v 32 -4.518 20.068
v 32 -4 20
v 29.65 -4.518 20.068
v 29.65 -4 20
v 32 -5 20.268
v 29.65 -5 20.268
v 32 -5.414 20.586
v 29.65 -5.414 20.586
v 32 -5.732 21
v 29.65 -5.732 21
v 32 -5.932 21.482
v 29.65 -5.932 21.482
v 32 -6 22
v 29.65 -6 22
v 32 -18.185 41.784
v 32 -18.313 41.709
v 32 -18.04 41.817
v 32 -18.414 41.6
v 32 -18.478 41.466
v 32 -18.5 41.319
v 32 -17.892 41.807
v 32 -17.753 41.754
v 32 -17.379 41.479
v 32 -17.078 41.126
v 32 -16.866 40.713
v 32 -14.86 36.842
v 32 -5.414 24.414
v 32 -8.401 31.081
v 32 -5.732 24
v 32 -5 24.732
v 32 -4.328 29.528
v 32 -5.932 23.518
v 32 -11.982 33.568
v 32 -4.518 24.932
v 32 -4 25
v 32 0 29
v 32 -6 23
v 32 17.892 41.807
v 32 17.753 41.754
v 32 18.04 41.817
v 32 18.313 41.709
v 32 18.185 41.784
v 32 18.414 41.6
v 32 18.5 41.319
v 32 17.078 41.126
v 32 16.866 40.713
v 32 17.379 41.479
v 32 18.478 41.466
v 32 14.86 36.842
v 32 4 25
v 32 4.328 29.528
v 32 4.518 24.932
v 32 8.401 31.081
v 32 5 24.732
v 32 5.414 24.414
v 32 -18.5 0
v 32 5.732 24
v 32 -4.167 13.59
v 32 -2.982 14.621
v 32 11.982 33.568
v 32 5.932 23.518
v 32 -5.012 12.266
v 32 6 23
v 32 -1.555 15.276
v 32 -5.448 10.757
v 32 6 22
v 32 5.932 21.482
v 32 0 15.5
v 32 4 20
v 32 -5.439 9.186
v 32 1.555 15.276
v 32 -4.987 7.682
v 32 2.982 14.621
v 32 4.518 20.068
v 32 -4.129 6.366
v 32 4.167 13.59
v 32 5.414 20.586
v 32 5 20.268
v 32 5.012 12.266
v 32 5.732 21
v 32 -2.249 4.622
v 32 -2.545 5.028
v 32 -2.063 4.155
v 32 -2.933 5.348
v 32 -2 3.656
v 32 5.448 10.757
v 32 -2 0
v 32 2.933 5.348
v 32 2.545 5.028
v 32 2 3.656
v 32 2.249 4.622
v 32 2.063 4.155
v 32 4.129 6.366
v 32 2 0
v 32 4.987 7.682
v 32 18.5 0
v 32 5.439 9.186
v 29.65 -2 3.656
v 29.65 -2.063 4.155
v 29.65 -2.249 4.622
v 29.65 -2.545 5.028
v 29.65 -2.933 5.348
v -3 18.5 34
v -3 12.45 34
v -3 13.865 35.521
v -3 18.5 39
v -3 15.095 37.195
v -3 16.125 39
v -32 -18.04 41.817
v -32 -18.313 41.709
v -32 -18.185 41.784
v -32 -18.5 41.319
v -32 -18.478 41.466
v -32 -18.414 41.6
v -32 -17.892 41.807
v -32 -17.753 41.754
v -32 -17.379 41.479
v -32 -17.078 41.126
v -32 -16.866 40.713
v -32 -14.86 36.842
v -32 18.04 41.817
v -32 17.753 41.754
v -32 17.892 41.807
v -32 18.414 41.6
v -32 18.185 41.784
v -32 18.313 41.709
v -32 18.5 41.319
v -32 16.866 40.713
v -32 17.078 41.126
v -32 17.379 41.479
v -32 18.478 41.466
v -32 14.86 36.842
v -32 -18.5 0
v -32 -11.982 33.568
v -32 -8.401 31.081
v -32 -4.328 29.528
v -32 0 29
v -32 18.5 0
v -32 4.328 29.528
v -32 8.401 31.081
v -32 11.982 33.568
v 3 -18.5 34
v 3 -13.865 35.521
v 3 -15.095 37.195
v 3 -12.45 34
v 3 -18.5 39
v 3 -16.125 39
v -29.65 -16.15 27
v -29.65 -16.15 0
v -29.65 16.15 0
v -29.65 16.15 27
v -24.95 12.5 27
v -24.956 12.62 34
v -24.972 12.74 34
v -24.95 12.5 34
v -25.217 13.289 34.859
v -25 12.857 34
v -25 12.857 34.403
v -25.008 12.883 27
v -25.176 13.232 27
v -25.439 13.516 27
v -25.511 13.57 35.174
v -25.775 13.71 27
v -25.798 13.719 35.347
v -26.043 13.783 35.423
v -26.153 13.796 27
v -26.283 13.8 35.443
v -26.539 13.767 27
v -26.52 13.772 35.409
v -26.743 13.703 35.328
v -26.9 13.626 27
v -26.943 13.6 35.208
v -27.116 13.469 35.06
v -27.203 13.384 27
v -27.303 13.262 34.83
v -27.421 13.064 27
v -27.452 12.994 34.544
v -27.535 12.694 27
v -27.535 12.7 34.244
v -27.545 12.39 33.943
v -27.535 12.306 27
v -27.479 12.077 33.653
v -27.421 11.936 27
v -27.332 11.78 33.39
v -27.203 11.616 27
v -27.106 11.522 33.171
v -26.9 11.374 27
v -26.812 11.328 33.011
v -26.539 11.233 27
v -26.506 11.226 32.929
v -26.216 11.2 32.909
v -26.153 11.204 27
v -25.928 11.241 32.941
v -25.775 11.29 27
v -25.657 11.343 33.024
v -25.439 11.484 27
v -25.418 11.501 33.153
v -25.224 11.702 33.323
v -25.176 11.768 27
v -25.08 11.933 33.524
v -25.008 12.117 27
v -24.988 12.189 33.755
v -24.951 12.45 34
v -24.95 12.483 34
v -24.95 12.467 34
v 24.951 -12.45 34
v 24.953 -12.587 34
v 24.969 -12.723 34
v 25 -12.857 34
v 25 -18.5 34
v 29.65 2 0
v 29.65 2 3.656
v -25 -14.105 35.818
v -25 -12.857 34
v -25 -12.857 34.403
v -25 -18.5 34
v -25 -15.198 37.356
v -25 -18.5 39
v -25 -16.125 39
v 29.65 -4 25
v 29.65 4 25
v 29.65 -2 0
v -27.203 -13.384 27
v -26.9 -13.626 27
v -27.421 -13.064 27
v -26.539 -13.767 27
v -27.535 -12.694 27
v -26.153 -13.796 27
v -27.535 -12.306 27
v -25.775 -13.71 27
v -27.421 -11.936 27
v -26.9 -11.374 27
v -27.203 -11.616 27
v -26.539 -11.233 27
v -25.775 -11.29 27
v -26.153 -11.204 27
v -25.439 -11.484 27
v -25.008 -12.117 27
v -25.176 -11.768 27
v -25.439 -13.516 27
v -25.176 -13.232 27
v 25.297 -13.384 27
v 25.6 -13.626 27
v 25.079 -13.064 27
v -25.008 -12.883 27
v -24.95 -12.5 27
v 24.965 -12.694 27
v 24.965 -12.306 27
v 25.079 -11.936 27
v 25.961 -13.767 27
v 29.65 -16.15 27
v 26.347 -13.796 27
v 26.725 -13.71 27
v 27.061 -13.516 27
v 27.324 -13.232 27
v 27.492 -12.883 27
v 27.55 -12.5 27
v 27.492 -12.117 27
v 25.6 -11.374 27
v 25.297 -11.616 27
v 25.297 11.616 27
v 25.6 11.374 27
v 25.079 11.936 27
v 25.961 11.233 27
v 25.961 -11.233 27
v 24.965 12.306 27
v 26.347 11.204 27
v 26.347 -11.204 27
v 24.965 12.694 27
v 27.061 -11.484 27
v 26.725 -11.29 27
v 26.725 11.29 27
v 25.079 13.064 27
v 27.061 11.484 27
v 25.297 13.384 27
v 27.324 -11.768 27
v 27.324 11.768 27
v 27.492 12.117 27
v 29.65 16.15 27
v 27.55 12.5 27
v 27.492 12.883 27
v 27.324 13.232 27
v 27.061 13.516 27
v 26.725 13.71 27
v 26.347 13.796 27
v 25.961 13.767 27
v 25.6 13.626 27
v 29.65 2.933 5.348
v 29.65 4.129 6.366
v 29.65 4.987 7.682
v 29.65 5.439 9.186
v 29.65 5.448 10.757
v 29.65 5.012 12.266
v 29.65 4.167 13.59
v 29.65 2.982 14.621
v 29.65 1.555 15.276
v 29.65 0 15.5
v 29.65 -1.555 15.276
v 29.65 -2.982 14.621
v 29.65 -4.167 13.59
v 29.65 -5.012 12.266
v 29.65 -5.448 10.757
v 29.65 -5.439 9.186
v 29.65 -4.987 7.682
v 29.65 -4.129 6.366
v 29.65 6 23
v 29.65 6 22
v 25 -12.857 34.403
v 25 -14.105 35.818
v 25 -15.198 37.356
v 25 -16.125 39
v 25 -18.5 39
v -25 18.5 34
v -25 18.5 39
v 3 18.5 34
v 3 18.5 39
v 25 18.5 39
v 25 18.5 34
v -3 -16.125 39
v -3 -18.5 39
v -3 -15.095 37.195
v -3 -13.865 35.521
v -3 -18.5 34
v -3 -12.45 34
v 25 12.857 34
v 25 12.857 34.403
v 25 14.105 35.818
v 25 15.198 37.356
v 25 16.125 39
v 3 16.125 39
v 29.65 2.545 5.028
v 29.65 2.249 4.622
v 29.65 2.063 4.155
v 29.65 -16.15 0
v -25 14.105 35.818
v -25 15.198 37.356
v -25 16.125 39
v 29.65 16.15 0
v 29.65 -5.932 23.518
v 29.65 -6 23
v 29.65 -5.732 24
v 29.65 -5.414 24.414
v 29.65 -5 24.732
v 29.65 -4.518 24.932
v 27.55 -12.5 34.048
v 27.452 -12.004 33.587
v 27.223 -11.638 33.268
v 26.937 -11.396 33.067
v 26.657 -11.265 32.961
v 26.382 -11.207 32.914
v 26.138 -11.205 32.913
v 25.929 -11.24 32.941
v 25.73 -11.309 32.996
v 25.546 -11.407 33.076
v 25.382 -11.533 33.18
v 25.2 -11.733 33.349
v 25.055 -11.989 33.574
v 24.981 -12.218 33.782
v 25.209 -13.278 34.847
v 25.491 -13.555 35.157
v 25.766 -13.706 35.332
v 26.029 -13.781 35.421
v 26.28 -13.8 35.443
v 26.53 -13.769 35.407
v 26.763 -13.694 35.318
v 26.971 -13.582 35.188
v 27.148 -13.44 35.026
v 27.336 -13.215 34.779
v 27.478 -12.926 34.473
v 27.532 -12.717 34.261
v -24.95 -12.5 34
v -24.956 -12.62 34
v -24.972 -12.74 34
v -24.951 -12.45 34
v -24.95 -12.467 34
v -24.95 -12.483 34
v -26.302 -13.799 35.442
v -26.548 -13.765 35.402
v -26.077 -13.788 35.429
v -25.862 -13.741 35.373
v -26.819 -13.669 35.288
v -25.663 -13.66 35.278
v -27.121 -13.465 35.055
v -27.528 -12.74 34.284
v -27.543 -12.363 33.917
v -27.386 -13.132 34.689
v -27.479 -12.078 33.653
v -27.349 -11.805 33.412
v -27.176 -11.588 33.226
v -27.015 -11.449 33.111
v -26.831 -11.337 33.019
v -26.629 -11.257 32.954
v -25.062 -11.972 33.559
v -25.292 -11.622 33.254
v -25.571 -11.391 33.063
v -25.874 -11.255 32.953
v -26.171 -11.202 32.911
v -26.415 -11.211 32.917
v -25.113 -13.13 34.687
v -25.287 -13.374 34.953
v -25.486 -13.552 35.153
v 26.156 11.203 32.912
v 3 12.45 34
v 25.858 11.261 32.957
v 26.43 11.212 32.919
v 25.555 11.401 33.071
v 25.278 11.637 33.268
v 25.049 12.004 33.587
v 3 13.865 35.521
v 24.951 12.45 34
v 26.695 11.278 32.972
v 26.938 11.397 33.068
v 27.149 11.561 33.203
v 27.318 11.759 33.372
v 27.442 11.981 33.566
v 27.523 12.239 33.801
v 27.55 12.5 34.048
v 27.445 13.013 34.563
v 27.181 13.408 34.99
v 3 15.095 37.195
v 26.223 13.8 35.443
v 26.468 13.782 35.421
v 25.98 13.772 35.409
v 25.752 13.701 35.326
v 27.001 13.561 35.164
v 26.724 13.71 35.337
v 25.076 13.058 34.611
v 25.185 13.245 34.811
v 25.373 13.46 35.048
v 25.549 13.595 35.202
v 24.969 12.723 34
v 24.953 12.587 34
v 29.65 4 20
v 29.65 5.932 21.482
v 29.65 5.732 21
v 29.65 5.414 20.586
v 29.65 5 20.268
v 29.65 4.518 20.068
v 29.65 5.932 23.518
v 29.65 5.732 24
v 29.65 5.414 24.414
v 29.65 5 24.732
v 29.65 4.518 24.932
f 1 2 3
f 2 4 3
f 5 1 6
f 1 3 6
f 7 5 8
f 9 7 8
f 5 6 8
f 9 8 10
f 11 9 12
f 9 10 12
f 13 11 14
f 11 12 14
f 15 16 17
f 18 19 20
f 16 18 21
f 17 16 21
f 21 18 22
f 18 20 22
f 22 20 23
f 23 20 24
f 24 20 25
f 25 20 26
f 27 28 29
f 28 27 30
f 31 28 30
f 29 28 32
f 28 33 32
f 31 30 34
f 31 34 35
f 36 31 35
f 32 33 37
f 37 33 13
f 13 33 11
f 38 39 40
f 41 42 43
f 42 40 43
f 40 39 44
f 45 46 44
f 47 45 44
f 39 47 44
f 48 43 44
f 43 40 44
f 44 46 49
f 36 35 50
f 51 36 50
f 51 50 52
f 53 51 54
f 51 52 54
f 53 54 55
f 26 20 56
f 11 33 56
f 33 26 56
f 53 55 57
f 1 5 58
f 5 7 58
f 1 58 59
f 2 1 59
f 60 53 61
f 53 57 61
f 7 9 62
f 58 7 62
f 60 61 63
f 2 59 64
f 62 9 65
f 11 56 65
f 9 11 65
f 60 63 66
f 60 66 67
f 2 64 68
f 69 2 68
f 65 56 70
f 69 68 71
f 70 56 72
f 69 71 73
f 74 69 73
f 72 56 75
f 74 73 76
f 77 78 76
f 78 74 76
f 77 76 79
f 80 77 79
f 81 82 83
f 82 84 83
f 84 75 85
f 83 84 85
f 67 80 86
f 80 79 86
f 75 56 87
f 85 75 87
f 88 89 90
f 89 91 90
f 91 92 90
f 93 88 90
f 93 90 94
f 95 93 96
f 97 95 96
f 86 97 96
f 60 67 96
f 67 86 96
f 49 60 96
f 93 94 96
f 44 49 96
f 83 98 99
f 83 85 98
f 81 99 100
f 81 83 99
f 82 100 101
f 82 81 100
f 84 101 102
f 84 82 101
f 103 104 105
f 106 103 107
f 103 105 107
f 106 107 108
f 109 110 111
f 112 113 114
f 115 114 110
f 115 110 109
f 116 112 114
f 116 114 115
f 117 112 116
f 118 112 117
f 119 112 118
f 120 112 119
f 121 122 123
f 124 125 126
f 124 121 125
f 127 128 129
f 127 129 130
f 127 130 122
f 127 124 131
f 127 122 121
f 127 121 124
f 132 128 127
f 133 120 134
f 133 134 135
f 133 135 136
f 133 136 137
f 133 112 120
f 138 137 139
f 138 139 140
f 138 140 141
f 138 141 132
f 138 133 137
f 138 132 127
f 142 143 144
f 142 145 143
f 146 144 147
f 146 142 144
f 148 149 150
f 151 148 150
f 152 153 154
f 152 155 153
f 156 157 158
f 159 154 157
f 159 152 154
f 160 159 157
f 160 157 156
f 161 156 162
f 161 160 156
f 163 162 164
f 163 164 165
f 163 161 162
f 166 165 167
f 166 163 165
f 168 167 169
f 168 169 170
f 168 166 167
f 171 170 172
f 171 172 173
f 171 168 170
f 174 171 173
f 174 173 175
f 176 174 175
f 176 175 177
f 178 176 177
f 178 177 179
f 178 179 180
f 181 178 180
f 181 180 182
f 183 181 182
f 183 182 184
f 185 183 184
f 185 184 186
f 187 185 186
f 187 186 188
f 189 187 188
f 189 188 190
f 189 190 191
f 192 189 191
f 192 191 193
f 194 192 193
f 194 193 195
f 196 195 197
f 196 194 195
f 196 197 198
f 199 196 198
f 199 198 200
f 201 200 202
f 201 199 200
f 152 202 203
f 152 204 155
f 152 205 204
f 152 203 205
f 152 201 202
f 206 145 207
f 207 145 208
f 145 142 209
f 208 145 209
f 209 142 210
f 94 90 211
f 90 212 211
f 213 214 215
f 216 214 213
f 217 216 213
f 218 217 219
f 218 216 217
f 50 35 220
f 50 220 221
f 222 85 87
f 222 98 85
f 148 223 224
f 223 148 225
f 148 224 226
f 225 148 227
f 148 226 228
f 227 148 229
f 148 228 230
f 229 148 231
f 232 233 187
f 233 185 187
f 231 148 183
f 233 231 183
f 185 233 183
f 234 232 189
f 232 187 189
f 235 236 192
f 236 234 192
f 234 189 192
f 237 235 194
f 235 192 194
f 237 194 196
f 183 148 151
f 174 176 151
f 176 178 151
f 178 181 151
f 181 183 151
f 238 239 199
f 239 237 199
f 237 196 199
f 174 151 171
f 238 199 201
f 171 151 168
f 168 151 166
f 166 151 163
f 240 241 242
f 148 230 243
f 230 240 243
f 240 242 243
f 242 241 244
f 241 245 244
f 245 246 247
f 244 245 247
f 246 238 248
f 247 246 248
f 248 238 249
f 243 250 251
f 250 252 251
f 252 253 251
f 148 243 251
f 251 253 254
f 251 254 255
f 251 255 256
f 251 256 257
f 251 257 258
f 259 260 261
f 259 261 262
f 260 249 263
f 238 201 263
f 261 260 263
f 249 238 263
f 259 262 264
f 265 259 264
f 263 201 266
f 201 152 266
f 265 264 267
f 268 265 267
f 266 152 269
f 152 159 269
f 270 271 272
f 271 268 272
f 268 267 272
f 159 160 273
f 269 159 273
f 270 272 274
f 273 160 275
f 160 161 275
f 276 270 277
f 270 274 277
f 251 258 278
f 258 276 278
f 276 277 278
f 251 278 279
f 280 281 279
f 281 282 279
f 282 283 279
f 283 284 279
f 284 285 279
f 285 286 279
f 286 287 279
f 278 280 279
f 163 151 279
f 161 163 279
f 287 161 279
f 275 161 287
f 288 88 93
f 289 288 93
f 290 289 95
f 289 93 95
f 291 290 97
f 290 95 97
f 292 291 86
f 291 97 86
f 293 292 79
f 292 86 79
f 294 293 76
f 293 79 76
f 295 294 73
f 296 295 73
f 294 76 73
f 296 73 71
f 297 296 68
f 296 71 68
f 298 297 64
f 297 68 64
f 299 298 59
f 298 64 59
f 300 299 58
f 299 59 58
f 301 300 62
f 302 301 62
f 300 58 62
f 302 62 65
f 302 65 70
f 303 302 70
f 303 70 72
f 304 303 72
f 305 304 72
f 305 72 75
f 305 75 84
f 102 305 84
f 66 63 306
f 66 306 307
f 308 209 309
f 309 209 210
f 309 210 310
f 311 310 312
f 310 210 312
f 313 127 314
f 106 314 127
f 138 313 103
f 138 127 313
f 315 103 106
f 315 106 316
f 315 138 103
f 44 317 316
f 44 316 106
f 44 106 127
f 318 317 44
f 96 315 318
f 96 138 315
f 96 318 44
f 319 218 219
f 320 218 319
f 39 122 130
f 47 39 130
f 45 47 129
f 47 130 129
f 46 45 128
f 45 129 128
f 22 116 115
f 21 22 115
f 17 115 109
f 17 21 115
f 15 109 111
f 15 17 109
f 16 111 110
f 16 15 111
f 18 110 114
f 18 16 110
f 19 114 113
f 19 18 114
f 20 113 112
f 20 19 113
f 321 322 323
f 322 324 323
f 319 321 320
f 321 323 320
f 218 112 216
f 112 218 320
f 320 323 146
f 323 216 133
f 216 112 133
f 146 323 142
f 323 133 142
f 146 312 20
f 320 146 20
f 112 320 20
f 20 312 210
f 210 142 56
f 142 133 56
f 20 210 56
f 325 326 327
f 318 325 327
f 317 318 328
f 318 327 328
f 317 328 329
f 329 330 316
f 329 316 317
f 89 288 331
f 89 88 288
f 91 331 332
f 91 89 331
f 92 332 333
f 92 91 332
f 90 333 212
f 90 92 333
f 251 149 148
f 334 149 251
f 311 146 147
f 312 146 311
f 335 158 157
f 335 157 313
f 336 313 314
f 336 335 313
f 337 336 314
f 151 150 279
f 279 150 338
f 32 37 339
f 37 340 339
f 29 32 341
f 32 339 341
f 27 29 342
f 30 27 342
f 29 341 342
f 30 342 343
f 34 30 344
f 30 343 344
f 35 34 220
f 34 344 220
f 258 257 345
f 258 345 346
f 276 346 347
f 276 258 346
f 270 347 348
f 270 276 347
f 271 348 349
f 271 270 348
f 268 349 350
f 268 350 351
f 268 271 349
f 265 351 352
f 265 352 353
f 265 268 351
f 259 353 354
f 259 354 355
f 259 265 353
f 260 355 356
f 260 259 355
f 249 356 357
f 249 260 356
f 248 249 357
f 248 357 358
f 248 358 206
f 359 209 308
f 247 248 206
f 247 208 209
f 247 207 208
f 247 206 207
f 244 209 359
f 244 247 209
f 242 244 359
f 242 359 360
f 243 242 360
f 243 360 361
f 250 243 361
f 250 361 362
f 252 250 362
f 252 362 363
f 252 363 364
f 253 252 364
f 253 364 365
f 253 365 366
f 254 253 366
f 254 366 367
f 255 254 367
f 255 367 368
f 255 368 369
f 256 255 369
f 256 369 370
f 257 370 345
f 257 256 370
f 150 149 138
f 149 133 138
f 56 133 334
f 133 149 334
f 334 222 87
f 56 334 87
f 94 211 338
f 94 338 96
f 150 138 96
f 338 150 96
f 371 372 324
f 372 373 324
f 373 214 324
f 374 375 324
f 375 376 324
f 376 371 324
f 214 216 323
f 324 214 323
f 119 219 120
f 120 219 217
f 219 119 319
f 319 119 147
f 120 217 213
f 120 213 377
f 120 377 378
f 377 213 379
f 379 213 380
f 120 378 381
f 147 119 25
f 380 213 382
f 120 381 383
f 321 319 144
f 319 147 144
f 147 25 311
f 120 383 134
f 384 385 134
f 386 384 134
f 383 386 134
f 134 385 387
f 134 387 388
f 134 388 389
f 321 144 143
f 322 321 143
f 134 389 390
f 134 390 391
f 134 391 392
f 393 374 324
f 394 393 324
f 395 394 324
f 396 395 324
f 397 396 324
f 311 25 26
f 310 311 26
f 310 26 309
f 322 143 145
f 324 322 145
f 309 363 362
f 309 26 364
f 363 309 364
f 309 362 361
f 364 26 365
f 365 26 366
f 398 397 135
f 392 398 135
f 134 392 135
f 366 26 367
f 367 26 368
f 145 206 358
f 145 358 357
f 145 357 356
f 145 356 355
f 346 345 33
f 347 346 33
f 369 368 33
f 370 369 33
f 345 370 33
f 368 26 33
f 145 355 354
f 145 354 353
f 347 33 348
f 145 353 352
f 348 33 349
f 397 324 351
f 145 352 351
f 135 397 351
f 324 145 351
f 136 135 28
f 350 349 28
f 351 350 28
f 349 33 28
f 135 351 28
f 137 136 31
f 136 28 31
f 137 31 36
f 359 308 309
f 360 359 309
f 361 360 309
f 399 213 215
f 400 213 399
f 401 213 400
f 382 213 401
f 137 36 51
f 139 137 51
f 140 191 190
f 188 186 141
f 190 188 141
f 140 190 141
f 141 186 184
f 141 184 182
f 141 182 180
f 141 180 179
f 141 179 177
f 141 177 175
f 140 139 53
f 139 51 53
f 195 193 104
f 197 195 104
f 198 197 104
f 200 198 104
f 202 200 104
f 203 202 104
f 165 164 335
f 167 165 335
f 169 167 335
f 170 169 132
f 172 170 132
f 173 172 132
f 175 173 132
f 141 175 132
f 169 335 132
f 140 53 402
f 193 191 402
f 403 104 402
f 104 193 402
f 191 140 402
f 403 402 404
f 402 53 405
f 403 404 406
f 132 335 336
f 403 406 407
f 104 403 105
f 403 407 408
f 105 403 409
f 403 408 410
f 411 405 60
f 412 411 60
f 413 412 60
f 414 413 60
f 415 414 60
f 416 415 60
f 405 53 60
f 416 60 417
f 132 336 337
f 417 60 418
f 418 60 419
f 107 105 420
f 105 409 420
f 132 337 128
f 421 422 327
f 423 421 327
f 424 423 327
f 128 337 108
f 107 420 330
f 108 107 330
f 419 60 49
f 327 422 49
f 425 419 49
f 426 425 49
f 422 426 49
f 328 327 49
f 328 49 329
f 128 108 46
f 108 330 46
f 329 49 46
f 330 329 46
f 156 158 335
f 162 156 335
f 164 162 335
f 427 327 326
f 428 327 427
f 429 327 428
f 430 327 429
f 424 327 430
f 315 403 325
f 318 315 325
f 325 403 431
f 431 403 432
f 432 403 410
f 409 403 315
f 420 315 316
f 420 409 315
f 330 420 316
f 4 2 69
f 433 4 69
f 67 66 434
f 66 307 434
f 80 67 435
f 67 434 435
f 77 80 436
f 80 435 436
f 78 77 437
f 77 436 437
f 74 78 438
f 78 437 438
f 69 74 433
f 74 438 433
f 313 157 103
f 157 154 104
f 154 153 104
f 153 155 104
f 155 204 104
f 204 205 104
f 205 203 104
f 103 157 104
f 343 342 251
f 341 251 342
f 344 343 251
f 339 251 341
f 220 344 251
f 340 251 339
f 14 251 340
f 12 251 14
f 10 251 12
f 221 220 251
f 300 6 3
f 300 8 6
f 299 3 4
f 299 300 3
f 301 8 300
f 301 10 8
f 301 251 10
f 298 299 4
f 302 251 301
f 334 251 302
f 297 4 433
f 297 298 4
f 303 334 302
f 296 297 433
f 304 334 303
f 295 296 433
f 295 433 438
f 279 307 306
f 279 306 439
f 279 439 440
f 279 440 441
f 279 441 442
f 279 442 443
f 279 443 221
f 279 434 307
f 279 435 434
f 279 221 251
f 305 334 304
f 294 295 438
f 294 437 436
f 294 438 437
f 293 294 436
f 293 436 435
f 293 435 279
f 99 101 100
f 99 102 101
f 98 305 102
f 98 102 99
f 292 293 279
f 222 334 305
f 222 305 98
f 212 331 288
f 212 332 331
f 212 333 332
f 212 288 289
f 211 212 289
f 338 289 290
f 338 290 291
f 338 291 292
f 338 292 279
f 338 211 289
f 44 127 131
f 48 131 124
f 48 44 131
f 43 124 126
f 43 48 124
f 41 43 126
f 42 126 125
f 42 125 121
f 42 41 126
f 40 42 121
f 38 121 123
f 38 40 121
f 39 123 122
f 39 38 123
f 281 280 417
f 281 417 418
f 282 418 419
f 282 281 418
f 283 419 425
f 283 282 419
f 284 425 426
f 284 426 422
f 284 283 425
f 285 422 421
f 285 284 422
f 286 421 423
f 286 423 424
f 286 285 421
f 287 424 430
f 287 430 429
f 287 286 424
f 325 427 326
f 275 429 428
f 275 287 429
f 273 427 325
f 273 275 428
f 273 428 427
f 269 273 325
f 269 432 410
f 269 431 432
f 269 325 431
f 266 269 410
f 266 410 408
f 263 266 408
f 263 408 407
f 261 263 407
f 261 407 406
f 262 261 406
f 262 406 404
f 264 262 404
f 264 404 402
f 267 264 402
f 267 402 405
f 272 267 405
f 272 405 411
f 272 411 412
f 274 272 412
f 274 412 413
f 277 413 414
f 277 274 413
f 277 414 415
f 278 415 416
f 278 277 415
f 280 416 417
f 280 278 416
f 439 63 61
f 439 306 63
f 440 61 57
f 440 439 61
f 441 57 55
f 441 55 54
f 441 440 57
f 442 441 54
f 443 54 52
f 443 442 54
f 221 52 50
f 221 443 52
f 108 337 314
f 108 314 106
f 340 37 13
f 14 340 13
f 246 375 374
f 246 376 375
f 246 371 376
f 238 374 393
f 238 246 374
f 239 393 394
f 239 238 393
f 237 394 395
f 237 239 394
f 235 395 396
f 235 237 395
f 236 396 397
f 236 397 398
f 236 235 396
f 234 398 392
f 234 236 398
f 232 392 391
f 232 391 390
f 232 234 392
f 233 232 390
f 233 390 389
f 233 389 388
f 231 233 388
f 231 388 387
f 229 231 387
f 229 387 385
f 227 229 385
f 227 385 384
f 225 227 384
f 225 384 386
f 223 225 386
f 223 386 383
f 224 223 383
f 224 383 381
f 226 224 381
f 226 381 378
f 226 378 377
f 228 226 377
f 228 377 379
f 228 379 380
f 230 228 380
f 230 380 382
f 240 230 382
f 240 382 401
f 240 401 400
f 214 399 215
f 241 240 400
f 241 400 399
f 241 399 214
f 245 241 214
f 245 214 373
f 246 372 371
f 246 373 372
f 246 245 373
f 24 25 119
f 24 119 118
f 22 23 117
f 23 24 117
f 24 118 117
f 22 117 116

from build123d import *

# Parameters (mm, degrees)
SKETCH_1_W                 = 64
SKETCH_1_H                 = 37
EXTRUDE_1_DEPTH            = 42
SHELL_1_T                  = -2.35
SHELL_1_THICKNESS_2_FACE_W = 59.3
SHELL_1_THICKNESS_2_FACE_H = 32.3
SHELL_1_THICKNESS_2_DEPTH  = 12.65
F_3_0MM_START              = 27
F_3_0MM_1_OUTLINE_R        = 1.3
F_3_0MM_1_DEPTH            = 15
SKETCH_4_R                 = 18
CUT_EXTRUDE_1_DEPTH        = 79.754364958
SKETCH_5_W                 = 22
SKETCH_5_H                 = 5
CUT_EXTRUDE_2_DEPTH        = 65.474801394
SKETCH_6_R                 = 5.5
SKETCH_6_W                 = 5
SKETCH_6_H                 = 12
CUT_EXTRUDE_3_DEPTH        = 10
CUT_EXTRUDE_1_2_DEPTH      = 79.754365093
CUT_EXTRUDE_1_2_DEPTH_BACK = 10
SKETCH_7_W                 = 5
SKETCH_7_H                 = 4
FILLET_1_R                 = 2
FILLET_2_R                 = 2
FILLET_3_R                 = 0.5


# Read off the part's stored shape, not the designer's step: Ø3.0mm 暗销孔1
with BuildPart() as part:
    # 草图1 → 凸台-拉伸1 (new body)
    with BuildSketch(Plane.XY):
        Rectangle(SKETCH_1_W, SKETCH_1_H)
    extrude(amount=EXTRUDE_1_DEPTH)

    # 抽壳1
    shell_1_openings = [part.faces().sort_by_distance(p)[0] for p in [
        (0, 0, 0),
    ]]
    offset(amount=SHELL_1_T, openings=shell_1_openings, kind=Kind.INTERSECTION)

    # 抽壳1 thickness 2 face (on inner face of the shell) → 抽壳1 thickness 2 (add)
    with BuildSketch(Plane.XY.offset(39.65)):
        Rectangle(SHELL_1_THICKNESS_2_FACE_W, SHELL_1_THICKNESS_2_FACE_H)
    extrude(amount=-SHELL_1_THICKNESS_2_DEPTH)

    # Ø3.0mm 暗销孔1 outline → Ø3.0mm 暗销孔1 (cut)
    with BuildSketch(Plane.XY.offset(F_3_0MM_START)):
        with Locations((26.25, -12.5)):
            Circle(F_3_0MM_1_OUTLINE_R)
        with Locations((-26.25, 12.5)):
            Circle(F_3_0MM_1_OUTLINE_R)
        with Locations((-26.25, -12.5)):
            Circle(F_3_0MM_1_OUTLINE_R)
        with Locations((26.25, 12.5)):
            Circle(F_3_0MM_1_OUTLINE_R)
    extrude(amount=F_3_0MM_1_DEPTH, mode=Mode.SUBTRACT)

    # 草图4 → Cut-Extrude 1 (cut, through all)
    with BuildSketch(Plane(origin=(32, 0, 0), x_dir=(0, 0, -1), z_dir=(1, 0, 0))):
        with Locations((-47, 0)):
            Circle(SKETCH_4_R)
    extrude(amount=-CUT_EXTRUDE_1_DEPTH, mode=Mode.SUBTRACT)

    # 草图5 → 切除-拉伸2 (cut, through all)
    with BuildSketch(Plane.XZ.offset(18.5)):
        with Locations((14, 36.5)):
            Rectangle(SKETCH_5_W, SKETCH_5_H)
        with Locations((-14, 36.5)):
            Rectangle(SKETCH_5_W, SKETCH_5_H)
    extrude(amount=-CUT_EXTRUDE_2_DEPTH, mode=Mode.SUBTRACT)

    # 草图6 → 切除-拉伸3 (cut)
    with BuildSketch(Plane(origin=(32, 0, 0), x_dir=(0, 0, -1), z_dir=(1, 0, 0))):
        with Locations(Location((-10, 0, 0), (0, 0, 90))):
            Circle(SKETCH_6_R)
        with Locations((-22.5, 0)):
            Rectangle(SKETCH_6_W, SKETCH_6_H)
    extrude(amount=-CUT_EXTRUDE_3_DEPTH, mode=Mode.SUBTRACT)

    # 草图7 → Cut-Extrude 1 2 (cut, two sides: drawn at the far end of the back side and taken through both)
    with BuildSketch(Plane(origin=(32, 0, 0), x_dir=(0, 0, -1), z_dir=(1, 0, 0)).offset(-CUT_EXTRUDE_1_2_DEPTH_BACK)):
        with Locations((-2.5, 0)):
            Rectangle(SKETCH_7_W, SKETCH_7_H)
    extrude(amount=CUT_EXTRUDE_1_2_DEPTH + CUT_EXTRUDE_1_2_DEPTH_BACK, mode=Mode.SUBTRACT)

    # 圆角1
    fillet_1_edges = [part.edges().sort_by_distance(p)[0] for p in [
        (30.825, -6, 25),
        (30.825, 6, 25),
        (30.825, 6, 20),
        (30.825, -6, 20),
        (30.825, -2, 4.876524617),
        (30.825, 2, 4.876524617),
    ]]
    fillet(fillet_1_edges, radius=FILLET_1_R)

    # 圆角2
    # the kernel refuses this fillet: 2 mm, written as the material it takes off along each edge
    with BuildSketch(Plane(origin=(-35.388469359, -17.291616466, 42), x_dir=(0, -1.0, -4.0690356929386436e-12), z_dir=(1, 0, 0))) as fillet_2_piece_1:
        with BuildLine():
            CenterArc((1.448789292, 1.985498696), FILLET_2_R, 200.442973307, 62.653215254)
            Line((-0.425251284, 1.286948826), (-0.462732095, 1.272977829))
            ThreePointArc((-0.462732095, 1.272977829), (-0.238488291, 0.634928522), (-0.038425814, -0.011111111))
            Line((-0.038425814, -0.011111111), (0, -0.04))
            ThreePointArc((0, -0.04), (0.604191767, -0.04), (1.203575419, -0.039709974))
            Line((1.203575419, -0.039709974), (1.208383534, 0))
        make_face()
    extrude(amount=70.776938719, mode=Mode.SUBTRACT)
    with BuildSketch(Plane(origin=(-35.388469359, 17.291616466, 42), x_dir=(0, -0.31374880411831046, -0.9495060231058727), z_dir=(1, 0, 0))) as fillet_2_piece_2:
        with BuildLine():
            CenterArc((1.430687063, 1.998582), FILLET_2_R, 205.189108199, 62.653215254)
            Line((-0.379128889, 1.147367444), (-0.415325208, 1.130343153))
            ThreePointArc((-0.415325208, 1.130343153), (-0.227544685, 0.56113377), (-0.037980241, -0.012549952))
            Line((-0.037980241, -0.012549952), (0.001505986, -0.03997164))
            ThreePointArc((0.001505986, -0.03997164), (0.677693872, -0.027238004), (1.353881757, -0.03997164))
            Line((1.353881757, -0.03997164), (1.355387744, 0))
        make_face()
    extrude(amount=70.776938719, mode=Mode.SUBTRACT)

    # 圆角3
    fillet_3_edges = [part.edges().sort_by_distance(p)[0] for p in [
        (0, -18.5, 42),
        (0, 18.5, 42),
    ]]
    fillet(fillet_3_edges, radius=FILLET_3_R)


solid = part.part
